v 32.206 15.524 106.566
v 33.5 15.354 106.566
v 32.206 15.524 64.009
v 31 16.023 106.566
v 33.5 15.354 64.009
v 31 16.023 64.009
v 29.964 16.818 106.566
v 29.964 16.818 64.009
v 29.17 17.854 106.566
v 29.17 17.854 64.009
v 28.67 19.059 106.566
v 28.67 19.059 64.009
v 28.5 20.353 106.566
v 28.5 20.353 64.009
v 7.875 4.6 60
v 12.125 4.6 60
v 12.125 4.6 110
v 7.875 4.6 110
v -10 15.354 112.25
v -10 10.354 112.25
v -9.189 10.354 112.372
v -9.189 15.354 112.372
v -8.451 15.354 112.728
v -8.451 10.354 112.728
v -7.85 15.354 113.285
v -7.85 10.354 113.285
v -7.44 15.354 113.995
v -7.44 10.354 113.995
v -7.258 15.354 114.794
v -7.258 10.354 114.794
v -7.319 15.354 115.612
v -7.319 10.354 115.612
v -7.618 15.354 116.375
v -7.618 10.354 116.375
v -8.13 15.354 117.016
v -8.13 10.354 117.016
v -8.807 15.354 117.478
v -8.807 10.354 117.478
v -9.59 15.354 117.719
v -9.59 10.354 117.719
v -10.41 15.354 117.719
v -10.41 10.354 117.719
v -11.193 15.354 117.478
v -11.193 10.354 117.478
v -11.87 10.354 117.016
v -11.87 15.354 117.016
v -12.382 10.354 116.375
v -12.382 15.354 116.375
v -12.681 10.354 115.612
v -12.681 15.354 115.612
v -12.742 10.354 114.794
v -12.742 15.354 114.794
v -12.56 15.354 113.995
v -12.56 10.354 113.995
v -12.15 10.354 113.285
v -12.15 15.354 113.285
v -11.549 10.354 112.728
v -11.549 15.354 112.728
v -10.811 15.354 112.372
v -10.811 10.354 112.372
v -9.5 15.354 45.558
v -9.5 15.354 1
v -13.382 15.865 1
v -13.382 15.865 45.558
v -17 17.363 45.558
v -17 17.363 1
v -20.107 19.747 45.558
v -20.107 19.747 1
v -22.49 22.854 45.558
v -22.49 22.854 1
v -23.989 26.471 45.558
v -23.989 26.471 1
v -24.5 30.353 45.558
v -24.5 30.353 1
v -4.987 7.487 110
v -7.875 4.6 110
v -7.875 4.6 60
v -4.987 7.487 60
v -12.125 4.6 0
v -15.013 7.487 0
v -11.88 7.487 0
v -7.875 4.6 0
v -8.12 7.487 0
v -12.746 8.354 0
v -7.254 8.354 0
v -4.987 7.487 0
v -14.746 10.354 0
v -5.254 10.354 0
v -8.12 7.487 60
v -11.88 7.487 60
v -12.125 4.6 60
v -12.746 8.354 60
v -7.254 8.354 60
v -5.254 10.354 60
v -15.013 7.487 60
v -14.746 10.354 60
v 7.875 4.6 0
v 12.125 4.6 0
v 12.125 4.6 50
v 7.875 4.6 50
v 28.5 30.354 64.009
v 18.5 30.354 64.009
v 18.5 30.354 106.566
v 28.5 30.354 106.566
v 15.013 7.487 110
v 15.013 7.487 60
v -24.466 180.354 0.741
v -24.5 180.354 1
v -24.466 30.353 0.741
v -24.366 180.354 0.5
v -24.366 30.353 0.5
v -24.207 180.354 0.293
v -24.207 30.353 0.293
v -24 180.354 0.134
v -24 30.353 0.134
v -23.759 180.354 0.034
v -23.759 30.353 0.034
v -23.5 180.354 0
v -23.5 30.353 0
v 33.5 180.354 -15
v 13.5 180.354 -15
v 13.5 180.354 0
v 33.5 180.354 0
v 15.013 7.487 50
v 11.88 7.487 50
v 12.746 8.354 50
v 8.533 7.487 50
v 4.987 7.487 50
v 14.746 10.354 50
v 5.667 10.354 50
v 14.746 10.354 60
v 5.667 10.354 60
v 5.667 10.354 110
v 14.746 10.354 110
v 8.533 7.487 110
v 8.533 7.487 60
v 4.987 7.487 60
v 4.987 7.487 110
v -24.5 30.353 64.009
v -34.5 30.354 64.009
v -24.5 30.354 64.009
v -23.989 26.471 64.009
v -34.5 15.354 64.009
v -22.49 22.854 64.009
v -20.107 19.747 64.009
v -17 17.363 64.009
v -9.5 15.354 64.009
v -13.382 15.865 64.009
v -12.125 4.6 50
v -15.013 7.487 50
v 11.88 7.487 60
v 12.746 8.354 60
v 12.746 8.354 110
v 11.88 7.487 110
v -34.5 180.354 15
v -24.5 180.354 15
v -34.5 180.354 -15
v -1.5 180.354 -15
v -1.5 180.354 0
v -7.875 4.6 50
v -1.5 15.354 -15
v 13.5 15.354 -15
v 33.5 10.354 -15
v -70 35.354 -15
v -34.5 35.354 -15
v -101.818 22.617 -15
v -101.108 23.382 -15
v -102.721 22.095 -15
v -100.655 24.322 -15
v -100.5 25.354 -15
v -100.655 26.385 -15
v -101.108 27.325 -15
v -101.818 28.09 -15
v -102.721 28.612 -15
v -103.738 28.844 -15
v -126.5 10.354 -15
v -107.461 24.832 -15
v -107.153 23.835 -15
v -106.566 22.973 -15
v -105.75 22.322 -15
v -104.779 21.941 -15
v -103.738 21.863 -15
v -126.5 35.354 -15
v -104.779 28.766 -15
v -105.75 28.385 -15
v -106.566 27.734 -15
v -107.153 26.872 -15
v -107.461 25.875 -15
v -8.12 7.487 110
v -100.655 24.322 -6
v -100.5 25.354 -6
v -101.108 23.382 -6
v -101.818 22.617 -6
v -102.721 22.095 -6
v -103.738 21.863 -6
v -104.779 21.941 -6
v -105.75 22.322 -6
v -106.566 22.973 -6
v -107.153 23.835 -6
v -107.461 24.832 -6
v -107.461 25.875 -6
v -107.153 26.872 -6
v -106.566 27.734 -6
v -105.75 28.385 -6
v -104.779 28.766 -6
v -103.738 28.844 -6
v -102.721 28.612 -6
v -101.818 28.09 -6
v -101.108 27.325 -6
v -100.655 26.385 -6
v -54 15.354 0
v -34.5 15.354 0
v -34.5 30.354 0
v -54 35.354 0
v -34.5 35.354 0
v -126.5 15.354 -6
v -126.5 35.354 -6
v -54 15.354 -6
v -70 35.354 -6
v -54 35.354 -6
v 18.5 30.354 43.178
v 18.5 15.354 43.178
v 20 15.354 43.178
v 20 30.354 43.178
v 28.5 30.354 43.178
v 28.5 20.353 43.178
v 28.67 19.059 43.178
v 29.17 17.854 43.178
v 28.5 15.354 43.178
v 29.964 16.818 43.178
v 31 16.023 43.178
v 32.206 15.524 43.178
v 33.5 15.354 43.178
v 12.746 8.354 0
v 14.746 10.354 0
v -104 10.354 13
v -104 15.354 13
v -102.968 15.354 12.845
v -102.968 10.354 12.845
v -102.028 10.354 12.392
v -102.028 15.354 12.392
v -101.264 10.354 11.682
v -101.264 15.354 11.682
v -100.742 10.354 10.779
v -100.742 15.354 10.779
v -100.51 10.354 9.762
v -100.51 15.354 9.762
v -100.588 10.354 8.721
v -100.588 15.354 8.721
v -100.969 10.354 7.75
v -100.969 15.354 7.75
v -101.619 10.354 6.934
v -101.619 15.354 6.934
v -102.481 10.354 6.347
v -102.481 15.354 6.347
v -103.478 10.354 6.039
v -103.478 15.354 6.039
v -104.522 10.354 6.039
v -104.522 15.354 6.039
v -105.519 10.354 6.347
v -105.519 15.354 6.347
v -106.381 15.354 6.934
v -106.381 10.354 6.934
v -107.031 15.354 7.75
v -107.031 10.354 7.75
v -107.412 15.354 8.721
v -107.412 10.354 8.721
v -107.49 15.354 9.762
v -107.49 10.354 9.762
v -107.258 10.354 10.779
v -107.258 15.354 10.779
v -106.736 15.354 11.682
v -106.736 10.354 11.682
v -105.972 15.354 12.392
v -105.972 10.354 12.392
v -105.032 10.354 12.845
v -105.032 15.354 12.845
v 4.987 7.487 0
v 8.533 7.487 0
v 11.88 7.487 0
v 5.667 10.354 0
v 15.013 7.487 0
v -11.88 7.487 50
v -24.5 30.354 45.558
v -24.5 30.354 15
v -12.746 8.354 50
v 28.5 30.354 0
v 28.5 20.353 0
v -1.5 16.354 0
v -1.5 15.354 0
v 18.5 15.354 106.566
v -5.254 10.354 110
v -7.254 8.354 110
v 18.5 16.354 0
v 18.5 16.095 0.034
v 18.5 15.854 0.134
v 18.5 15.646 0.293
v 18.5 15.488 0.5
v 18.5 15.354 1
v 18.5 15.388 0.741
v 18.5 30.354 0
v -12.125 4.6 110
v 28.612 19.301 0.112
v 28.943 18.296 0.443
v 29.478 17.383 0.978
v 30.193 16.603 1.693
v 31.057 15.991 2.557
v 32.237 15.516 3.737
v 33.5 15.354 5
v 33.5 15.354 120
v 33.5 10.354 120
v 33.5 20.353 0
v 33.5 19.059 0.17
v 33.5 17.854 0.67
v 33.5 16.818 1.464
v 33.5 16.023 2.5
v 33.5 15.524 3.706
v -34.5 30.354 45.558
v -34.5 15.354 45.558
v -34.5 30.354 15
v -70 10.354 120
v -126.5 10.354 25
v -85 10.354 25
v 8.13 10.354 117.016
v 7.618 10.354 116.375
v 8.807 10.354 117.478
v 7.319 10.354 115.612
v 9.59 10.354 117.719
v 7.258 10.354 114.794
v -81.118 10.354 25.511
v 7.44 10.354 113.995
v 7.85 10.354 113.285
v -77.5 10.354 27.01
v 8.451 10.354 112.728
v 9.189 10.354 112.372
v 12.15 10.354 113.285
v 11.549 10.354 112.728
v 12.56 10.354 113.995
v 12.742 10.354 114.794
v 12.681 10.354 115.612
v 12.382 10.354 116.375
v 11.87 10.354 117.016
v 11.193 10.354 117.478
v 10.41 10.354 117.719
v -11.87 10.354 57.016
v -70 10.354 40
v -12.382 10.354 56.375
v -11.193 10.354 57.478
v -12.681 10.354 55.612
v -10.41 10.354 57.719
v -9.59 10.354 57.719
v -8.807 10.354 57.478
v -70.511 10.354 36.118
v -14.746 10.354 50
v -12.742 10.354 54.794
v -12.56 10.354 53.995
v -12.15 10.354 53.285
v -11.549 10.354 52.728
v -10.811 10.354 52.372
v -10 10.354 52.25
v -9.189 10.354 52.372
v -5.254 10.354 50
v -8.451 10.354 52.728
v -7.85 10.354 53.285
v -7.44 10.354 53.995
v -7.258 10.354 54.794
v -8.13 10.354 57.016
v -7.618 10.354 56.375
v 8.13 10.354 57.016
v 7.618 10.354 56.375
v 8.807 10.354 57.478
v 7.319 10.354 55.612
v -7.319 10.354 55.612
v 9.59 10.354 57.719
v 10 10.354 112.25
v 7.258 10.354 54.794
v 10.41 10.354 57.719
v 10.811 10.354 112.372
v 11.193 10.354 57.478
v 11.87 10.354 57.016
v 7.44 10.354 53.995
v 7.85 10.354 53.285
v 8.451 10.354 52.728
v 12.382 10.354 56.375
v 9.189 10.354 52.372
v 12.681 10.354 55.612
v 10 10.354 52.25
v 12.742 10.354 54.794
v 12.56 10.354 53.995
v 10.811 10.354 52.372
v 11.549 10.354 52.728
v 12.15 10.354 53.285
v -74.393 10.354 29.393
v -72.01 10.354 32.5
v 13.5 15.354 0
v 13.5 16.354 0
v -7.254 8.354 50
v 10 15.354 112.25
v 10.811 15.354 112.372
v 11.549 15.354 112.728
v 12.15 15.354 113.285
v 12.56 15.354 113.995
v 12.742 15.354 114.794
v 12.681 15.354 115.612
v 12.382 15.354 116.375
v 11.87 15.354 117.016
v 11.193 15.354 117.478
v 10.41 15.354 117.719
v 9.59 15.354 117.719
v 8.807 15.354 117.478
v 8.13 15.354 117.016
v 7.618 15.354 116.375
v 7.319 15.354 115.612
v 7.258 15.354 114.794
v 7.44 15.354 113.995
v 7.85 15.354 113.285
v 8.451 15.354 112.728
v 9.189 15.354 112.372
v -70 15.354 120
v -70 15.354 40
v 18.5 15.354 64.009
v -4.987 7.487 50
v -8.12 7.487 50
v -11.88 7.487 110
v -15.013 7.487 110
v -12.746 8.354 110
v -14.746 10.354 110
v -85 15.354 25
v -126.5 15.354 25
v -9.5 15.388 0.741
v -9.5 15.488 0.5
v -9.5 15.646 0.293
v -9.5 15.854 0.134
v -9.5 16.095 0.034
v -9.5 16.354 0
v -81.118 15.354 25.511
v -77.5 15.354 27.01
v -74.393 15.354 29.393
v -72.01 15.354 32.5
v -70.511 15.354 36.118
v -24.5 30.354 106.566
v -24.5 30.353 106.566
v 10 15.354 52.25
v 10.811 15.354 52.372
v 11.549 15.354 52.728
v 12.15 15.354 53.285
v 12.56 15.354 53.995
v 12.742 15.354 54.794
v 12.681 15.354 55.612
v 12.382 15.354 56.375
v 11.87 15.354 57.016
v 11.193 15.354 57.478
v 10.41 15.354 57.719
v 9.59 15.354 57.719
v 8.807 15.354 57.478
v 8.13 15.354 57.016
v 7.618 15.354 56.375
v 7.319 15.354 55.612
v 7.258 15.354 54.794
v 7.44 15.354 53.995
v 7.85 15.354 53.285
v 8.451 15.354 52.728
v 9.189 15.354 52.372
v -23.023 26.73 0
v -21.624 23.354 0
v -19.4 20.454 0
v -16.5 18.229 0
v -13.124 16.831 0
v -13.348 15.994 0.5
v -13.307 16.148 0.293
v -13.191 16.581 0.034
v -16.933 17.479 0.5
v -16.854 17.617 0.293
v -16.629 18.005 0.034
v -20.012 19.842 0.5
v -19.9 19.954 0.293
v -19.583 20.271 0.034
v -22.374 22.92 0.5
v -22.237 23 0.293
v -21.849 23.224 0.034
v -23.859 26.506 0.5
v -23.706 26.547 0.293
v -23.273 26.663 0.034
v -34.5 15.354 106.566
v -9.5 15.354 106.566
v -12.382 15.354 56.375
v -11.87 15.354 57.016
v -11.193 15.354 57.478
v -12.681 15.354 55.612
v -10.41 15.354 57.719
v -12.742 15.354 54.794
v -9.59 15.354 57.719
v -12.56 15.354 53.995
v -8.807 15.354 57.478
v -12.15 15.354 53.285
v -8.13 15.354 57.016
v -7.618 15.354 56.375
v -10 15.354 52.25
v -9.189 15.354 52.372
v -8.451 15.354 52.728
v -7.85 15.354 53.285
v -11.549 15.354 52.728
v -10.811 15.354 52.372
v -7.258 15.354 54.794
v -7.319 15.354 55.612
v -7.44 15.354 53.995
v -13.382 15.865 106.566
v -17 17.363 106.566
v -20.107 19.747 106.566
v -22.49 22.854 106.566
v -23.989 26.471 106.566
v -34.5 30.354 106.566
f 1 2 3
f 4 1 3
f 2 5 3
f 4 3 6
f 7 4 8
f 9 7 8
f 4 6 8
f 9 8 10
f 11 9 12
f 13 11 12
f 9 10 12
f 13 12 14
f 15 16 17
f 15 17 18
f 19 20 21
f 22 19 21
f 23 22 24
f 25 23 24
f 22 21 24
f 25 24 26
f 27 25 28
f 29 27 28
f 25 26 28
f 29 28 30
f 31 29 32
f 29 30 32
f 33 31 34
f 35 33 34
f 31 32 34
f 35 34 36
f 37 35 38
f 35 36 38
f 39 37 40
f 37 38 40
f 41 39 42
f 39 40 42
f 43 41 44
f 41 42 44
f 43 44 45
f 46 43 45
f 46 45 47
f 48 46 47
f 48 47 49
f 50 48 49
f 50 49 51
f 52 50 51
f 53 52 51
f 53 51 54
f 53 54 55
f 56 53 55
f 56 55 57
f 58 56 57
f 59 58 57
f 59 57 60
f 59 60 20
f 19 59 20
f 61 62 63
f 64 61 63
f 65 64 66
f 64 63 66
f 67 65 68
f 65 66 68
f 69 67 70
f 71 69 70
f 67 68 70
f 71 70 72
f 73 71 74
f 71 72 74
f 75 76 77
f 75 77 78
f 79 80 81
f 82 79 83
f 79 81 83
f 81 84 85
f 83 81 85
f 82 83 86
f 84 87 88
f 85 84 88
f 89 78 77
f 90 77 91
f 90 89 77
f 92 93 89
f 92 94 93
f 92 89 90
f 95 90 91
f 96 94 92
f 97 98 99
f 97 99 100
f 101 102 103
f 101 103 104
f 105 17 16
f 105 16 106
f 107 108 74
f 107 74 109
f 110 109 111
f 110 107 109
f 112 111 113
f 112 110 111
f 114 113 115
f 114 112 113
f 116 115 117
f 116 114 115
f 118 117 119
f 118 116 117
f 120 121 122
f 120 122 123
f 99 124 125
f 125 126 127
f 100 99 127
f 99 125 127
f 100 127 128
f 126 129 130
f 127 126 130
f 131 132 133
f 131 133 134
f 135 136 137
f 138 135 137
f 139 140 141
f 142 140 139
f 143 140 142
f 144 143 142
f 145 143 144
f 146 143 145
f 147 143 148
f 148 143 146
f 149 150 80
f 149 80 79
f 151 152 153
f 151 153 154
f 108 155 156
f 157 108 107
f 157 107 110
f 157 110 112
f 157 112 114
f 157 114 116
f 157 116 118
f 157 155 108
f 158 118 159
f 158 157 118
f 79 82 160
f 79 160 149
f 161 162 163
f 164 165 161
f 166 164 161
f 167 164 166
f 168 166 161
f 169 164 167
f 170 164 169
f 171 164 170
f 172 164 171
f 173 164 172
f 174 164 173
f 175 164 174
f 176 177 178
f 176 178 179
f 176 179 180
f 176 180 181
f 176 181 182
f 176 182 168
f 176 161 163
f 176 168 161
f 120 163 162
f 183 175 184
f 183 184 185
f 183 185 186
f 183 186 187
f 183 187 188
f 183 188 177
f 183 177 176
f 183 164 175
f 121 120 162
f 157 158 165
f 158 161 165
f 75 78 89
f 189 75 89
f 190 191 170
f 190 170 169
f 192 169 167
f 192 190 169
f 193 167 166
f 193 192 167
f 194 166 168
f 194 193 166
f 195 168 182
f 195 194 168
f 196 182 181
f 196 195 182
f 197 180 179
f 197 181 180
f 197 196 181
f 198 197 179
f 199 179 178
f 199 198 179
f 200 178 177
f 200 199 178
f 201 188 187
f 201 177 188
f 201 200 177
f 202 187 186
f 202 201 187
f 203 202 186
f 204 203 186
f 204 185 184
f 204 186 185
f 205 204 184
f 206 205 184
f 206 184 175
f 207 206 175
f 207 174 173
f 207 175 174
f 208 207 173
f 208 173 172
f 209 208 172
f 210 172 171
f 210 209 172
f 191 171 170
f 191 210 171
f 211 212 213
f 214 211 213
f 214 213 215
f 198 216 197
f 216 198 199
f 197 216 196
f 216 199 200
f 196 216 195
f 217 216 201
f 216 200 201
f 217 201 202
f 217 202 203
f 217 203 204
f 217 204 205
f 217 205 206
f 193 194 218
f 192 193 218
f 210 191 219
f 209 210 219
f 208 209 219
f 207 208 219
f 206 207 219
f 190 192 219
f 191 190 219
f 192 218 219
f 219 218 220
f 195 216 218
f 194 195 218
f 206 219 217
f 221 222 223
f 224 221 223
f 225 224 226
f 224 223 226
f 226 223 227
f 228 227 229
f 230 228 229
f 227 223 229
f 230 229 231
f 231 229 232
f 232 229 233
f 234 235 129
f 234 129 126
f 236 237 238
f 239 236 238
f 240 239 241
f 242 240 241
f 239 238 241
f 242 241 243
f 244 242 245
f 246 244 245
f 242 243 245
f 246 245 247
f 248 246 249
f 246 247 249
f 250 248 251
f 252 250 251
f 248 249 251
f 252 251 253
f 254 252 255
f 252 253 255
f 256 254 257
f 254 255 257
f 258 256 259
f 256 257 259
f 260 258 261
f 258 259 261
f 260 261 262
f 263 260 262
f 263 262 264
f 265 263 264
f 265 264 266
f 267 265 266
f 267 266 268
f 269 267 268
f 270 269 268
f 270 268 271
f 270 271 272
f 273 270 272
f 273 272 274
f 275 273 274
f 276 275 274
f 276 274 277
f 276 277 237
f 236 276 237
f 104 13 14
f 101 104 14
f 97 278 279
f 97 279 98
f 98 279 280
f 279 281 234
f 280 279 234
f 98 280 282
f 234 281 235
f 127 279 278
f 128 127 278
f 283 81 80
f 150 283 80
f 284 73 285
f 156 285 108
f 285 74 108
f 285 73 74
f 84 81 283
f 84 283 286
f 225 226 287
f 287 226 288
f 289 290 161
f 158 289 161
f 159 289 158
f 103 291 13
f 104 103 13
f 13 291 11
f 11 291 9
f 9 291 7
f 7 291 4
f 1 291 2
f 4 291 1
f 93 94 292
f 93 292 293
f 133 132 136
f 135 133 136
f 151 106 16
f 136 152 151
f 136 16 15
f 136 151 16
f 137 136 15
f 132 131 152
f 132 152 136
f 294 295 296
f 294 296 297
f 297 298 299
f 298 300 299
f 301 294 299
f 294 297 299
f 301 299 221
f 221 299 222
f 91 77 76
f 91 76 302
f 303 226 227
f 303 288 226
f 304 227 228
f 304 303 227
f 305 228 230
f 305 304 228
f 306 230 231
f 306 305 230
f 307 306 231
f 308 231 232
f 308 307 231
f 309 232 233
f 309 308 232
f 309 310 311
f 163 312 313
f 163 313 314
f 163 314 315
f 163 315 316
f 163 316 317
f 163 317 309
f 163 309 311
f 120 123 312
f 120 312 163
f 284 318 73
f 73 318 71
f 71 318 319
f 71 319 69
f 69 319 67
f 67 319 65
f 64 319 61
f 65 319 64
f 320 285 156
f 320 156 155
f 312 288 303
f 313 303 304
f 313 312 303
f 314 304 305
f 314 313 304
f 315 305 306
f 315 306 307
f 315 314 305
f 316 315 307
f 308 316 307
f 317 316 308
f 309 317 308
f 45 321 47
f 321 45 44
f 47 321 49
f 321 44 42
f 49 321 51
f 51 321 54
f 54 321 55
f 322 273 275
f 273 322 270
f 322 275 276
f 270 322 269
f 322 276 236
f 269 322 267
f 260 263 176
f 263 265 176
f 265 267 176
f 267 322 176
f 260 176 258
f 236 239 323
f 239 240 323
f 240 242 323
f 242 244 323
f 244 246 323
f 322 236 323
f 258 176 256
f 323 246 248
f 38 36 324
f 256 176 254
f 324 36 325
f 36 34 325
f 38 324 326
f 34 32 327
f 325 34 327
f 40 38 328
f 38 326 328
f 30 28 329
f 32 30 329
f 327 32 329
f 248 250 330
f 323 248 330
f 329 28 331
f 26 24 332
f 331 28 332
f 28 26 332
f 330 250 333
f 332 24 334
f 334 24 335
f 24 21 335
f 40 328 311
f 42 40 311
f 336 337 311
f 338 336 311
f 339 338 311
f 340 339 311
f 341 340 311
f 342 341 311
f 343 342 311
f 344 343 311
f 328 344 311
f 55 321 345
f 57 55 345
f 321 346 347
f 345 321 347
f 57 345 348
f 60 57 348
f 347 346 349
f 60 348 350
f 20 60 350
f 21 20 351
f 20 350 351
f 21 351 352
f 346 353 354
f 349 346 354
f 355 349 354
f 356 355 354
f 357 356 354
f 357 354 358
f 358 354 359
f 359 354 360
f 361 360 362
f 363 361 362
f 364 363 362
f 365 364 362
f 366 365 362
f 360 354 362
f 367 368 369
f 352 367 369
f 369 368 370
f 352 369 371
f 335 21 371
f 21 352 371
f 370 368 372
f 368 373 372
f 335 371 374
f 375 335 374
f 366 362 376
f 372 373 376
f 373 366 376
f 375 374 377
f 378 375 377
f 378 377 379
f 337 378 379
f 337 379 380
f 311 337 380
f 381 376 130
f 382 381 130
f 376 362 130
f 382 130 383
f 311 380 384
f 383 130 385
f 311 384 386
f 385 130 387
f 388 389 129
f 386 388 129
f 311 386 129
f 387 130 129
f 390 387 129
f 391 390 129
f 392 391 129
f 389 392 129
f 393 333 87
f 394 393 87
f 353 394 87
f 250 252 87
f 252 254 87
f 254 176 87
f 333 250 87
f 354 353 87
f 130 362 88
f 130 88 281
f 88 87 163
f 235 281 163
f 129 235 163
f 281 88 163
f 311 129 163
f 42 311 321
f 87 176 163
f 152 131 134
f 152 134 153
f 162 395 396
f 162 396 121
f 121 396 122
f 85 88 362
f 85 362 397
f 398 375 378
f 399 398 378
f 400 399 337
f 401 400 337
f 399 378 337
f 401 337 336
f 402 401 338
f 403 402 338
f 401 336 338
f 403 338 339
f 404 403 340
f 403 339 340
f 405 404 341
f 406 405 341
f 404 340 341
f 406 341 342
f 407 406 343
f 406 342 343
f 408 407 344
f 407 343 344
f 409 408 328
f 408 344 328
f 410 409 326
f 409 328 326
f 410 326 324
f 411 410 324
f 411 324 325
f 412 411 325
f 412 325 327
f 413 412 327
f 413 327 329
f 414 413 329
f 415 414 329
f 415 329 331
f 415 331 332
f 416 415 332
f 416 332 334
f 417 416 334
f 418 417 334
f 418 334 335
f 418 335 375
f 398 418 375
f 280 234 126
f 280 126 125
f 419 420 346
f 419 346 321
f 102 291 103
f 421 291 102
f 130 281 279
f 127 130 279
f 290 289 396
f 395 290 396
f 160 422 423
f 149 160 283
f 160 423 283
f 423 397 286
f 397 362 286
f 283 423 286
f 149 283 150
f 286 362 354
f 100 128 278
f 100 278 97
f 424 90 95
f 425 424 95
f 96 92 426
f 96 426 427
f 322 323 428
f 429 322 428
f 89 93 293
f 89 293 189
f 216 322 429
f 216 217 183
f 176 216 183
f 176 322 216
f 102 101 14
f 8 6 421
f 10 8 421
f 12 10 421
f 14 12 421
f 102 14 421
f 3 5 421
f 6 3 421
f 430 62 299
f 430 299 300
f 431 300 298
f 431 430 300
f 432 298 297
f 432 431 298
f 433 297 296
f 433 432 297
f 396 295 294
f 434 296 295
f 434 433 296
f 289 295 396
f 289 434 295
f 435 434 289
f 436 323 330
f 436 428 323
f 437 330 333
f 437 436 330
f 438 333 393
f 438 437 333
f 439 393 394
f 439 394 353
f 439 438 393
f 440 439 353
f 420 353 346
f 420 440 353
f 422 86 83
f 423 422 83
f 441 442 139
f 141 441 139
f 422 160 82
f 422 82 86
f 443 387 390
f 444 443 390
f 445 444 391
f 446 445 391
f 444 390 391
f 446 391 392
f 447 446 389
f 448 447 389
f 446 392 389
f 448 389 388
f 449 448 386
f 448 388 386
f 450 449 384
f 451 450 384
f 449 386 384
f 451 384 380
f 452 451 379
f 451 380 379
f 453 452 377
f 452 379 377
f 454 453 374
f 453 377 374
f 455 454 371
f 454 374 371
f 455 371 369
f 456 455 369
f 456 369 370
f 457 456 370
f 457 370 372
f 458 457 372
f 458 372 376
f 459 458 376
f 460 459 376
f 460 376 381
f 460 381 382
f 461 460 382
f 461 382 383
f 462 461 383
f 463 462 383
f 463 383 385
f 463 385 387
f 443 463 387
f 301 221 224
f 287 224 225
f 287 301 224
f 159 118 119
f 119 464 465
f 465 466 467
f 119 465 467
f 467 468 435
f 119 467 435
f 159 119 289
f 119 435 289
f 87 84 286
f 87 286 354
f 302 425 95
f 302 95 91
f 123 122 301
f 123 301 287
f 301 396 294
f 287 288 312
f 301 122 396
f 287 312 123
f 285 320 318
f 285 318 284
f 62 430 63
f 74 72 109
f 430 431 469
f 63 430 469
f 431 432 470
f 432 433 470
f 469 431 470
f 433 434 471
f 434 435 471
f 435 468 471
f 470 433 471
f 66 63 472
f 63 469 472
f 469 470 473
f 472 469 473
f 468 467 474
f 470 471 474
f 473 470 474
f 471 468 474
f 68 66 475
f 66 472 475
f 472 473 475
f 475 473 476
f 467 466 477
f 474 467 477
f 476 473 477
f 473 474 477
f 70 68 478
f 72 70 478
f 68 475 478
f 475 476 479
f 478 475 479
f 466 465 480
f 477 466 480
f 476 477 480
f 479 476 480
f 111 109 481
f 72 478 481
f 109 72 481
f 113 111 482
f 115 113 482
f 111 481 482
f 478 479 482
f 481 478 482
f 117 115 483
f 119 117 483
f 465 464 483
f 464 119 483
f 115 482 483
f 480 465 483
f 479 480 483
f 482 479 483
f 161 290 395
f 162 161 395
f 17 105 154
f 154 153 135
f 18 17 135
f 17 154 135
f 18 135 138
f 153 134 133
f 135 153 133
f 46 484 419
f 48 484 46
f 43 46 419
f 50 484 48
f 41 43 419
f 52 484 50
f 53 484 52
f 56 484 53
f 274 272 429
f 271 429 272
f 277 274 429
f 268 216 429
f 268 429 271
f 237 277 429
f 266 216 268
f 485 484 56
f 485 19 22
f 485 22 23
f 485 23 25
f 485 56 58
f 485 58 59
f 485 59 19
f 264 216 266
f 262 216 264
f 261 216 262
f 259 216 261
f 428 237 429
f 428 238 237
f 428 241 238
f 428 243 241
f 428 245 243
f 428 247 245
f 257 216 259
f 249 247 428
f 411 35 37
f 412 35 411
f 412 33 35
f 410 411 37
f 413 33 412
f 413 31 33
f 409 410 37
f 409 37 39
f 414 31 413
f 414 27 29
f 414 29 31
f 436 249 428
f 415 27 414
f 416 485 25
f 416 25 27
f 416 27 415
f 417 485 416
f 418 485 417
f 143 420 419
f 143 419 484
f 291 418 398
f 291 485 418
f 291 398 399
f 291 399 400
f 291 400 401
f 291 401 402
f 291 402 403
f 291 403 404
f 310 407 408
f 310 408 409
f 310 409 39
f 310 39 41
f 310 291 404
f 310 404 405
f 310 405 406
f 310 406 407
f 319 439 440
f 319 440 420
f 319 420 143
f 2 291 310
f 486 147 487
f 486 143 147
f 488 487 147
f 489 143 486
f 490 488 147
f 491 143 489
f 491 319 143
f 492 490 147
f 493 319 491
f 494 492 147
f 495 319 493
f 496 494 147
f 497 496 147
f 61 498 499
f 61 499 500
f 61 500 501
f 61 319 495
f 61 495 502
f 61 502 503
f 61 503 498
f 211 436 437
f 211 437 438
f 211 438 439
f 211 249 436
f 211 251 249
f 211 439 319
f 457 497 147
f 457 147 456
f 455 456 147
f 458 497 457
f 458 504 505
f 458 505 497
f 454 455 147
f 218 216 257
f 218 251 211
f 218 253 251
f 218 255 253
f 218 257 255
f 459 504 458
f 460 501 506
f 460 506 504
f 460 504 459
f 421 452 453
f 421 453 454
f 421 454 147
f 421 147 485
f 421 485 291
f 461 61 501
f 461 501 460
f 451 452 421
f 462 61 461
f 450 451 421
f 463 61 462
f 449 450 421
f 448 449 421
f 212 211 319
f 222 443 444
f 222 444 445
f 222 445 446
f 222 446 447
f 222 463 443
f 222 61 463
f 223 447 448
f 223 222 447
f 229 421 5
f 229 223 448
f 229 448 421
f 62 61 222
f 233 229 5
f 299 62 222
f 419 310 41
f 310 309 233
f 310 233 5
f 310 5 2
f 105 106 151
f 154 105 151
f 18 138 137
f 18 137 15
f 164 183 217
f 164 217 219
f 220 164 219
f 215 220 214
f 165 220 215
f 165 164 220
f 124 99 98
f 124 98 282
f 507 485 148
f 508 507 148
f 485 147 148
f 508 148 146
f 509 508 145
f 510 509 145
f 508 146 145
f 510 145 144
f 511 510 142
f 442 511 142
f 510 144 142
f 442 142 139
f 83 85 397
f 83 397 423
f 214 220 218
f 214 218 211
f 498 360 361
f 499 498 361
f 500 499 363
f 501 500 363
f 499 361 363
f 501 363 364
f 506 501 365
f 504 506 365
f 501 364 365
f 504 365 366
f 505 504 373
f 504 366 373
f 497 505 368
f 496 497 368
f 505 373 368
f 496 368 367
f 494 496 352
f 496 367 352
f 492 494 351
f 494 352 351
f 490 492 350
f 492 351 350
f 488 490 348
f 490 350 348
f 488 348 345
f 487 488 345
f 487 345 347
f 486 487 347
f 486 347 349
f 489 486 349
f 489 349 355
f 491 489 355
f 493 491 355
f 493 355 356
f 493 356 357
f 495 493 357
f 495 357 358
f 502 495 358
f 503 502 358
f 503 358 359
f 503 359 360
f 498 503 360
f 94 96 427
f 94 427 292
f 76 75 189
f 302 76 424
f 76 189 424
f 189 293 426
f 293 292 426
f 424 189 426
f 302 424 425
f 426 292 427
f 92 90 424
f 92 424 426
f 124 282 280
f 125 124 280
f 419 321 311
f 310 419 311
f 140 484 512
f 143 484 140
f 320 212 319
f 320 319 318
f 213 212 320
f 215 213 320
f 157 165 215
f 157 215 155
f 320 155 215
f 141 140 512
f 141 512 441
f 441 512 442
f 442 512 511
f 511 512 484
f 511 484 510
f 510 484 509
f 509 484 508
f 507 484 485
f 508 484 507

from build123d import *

# Parameters (mm, degrees)
BOSS_EXTRUDE1_DEPTH      = 250
BOSS_EXTRUDE2_DEPTH      = 50
BOSS_EXTRUDE2_2_DEPTH    = 50
LPATTERN1_COUNT          = 4
LPATTERN1_PITCH          = 60
SKETCH2_R                = 2.75
CUT_EXTRUDE1_DEPTH       = 251.864711302
UPPER_ACRYLIC_SUPP_W     = 20
UPPER_ACRYLIC_SUPP_H     = 250
BOSS_EXTRUDE3_DEPTH      = 5
UPPER_ACRYLIC_SUPP_3_W   = 10
UPPER_ACRYLIC_SUPP_3_H   = 66.073604859
UPPER_ACRYLIC_SUPP_3_H_2 = 41.475217291
UPPER_ACRYLIC_SUPP_3_H_3 = 42.557179481
UPPER_ACRYLIC_SUPP_3_H_4 = 45.558340935
BOSS_EXTRUDE4_DEPTH      = 15
FILLET1_R                = 15
SKETCH4_W                = 60
SKETCH4_H                = 15
BOSS_EXTRUDE5_DEPTH      = 5
SKETCH4_3_W              = 60
SKETCH4_3_H              = 15
BOSS_EXTRUDE6_DEPTH      = 60
SKETCH5_W                = 10
SKETCH5_H                = 45
BOSS_EXTRUDE7_DEPTH      = 15
BOSS_EXTRUDE8_START      = 250
SKETCH5_3_W              = 10
SKETCH5_3_H              = 45
BOSS_EXTRUDE8_DEPTH      = 15
FILLET2_R                = 1
SKETCH6_W                = 6
SKETCH6_H                = 60
CUT_EXTRUDE2_DEPTH       = 6
BOSS_EXTRUDE9_DEPTH      = 30
SKETCH8_W                = 333.602701612
SKETCH8_H                = 59.031331047
CUT_EXTRUDE3_DEPTH       = 150
SKETCH9_W                = 6
SKETCH9_H                = 20
CLOTH_ESCAPE_GAP_DEPTH   = 20
SKETCH11_W               = 9
SKETCH11_H               = 20
BOSS_EXTRUDE11_DEPTH     = 100
CUT_EXTRUDE4_DEPTH       = 68
SKETCH13_W               = 40
SKETCH13_H               = 5
BOSS_EXTRUDE13_DEPTH     = 100
CUT_EXTRUDE5_DEPTH       = 100
FILLET3_R                = 15
BOSS_EXTRUDE14_START     = -5
BOSS_EXTRUDE14_DEPTH     = 25
CUT_EXTRUDE6_DEPTH       = 30
CUT_EXTRUDE6_DEPTH_BACK  = 10
SKETCH16_5_W             = 8.5
SKETCH16_5_H             = 41.475217291
SKETCH16_5_H_2           = 42.557179481
SKETCH16_5_W_2           = 1.5
SKETCH16_5_H_3           = 42.177819043
SKETCH16_5_H_4           = 20.831100018
SKETCH16_5_H_5           = 17.311395043
SKETCH16_5_H_6           = 18.573684265
SKETCH16_5_H_7           = 65.073604859
SKETCH16_6_W             = 8.5
SKETCH16_6_H             = 41.475217291
SKETCH16_6_H_2           = 42.557179481
SKETCH16_6_W_2           = 1.5
SKETCH16_6_H_3           = 42.177819043
SKETCH16_6_H_4           = 20.831100018
SKETCH16_6_H_5           = 17.311395043
SKETCH16_6_H_6           = 18.573684265
SKETCH16_6_H_7           = 65.073604859
BOSS_EXTRUDE15_DEPTH     = 5
BOSS_EXTRUDE16_DEPTH     = 20
SKETCH16_8_W             = 8.5
SKETCH16_8_H             = 41.475217291
SKETCH16_8_H_2           = 42.557179481
SKETCH16_8_W_2           = 1.5
SKETCH16_8_H_3           = 42.177819043
SKETCH16_8_H_4           = 65.073604859
BOSS_EXTRUDE17_DEPTH     = 15
BOSS_EXTRUDE18_START     = -5
BOSS_EXTRUDE18_DEPTH     = 25
FILLET4_R                = 5
BOSS_EXTRUDE21_START     = 145
BOSS_EXTRUDE21_DEPTH     = 170
SKETCH19_R               = 3.5
CUT_EXTRUDE7_DEPTH       = 10
CUT_EXTRUDE8_DEPTH       = 355
CUT_EXTRUDE8_DEPTH_BACK  = 10
SKETCH20_R               = 3.5
SKETCH21_W               = 15
SKETCH21_H               = 197.501027769
CUT_EXTRUDE9_DEPTH       = 130
SKETCH22_W               = 160
SKETCH22_H               = 135
SKETCH22_H_2             = 10
CUT_EXTRUDE10_DEPTH      = 270


with BuildPart() as part:
    # profile → Boss-Extrude1 (new body)
    with BuildSketch(Plane.XY):
        Polygon((-14.746446609, 10.353553391), (-5.253553391, 10.353553391), (5.667330529, 10.353553391), (14.746446609, 10.353553391), (20, 10.353553391), (20, 15.353553391), (-20, 15.353553391), (-20, 10.353553391), align=None)
    extrude(amount=BOSS_EXTRUDE1_DEPTH)

    # Sketch2 → Cut-Extrude1 (cut, through all)
    with BuildSketch(Plane.XZ.offset(-10.353553391)):
        with Locations(Location((-10, 175, 0), (0, 0, 270))):
            Circle(SKETCH2_R)
        with Locations(Location((10, 175, 0), (0, 0, 270))):
            Circle(SKETCH2_R)
        with Locations(Location((-10, 115, 0), (0, 0, 270))):
            Circle(SKETCH2_R)
        with Locations(Location((10, 115, 0), (0, 0, 270))):
            Circle(SKETCH2_R)
        with Locations(Location((-10, 55, 0), (0, 0, 270))):
            Circle(SKETCH2_R)
        with Locations(Location((10, 55, 0), (0, 0, 270))):
            Circle(SKETCH2_R)
    extrude(amount=-CUT_EXTRUDE1_DEPTH, mode=Mode.SUBTRACT)

    # upper_acrylic_supp → Boss-Extrude3 (add)
    with BuildSketch(Plane(origin=(0, 15.353553391, 0), x_dir=(1, 0, 0), z_dir=(0, 1, 0))):
        with Locations((-30, -125)):
            Rectangle(UPPER_ACRYLIC_SUPP_W, UPPER_ACRYLIC_SUPP_H)
    extrude(amount=-BOSS_EXTRUDE3_DEPTH)

    # upper_acrylic_supp<3> → Boss-Extrude4 (add)
    with BuildSketch(Plane(origin=(0, 15.353553391, 0), x_dir=(1, 0, 0), z_dir=(0, 1, 0))):
        with Locations((-29.5, -216.963197571)):
            Rectangle(UPPER_ACRYLIC_SUPP_3_W, UPPER_ACRYLIC_SUPP_3_H)
        with Locations((-29.5, -144.615102231)):
            Rectangle(UPPER_ACRYLIC_SUPP_3_W, UPPER_ACRYLIC_SUPP_3_H_2)
        with Locations((-29.5, -85.287508801)):
            Rectangle(UPPER_ACRYLIC_SUPP_3_W, UPPER_ACRYLIC_SUPP_3_H_3)
        with Locations((-29.5, -22.779170468)):
            Rectangle(UPPER_ACRYLIC_SUPP_3_W, UPPER_ACRYLIC_SUPP_3_H_4)
    extrude(amount=BOSS_EXTRUDE4_DEPTH)

    # Fillet1
    fillet1_edges = [part.edges().sort_by_distance(p)[0] for p in [
        (-24.5, 15.353553391, 22.779170467),
        (-24.5, 15.353553391, 85.287508801),
        (-24.5, 15.353553391, 144.615102231),
        (-24.5, 15.353553391, 216.963197571),
    ]]
    fillet(fillet1_edges, radius=FILLET1_R - 0.0001)  # a hair under: the kernel refuses the full size



with BuildPart() as body_2:
    # Sketch1<3> → Boss-Extrude2 (new body)
    with BuildSketch(Plane.XY):
        Polygon((-7.253553391, 8.353553391), (-8.119669914, 7.487436867), (-5.5, 7.487436867), (-4.987436867, 7.487436867), (-5.5, 6.974873734), (-7.874873734, 4.6), (-12.125126266, 4.6), (-14.5, 6.974873734), (-15.012563133, 7.487436867), (-14.5, 7.487436867), (-11.880330086, 7.487436867), (-12.746446609, 8.353553391), (-14.746446609, 10.353553391), (-5.253553391, 10.353553391), align=None)
    boss_extrude2 = extrude(amount=BOSS_EXTRUDE2_DEPTH)


with BuildPart() as body_3:
    # Sketch1<3> → Boss-Extrude2 2 (new body)
    with BuildSketch(Plane.XY):
        Polygon((12.746446609, 8.353553391), (11.880330086, 7.487436867), (14.5, 7.487436867), (15.012563133, 7.487436867), (14.5, 6.974873734), (12.125126266, 4.6), (7.874873734, 4.6), (5.5, 6.974873734), (4.987436867, 7.487436867), (5.5, 7.487436867), (8.533447053, 7.487436867), (7.667330529, 8.353553391), (5.667330529, 10.353553391), (14.746446609, 10.353553391), align=None)
    boss_extrude2_2 = extrude(amount=BOSS_EXTRUDE2_2_DEPTH)


with BuildPart() as lpattern1_1:
    # LPattern1: pattern copy
    add(boss_extrude2.moved(Location(Vector(0, 0, 1) * (1 * LPATTERN1_PITCH))))


with BuildPart() as lpattern1_2:
    # LPattern1: pattern copy
    add(boss_extrude2.moved(Location(Vector(0, 0, 1) * (2 * LPATTERN1_PITCH))))


with BuildPart() as lpattern1_3:
    # LPattern1: pattern copy
    add(boss_extrude2.moved(Location(Vector(0, 0, 1) * (3 * LPATTERN1_PITCH))))


with BuildPart() as lpattern1_4:
    # LPattern1: pattern copy
    add(boss_extrude2_2.moved(Location(Vector(0, 0, 1) * (1 * LPATTERN1_PITCH))))


with BuildPart() as lpattern1_5:
    # LPattern1: pattern copy
    add(boss_extrude2_2.moved(Location(Vector(0, 0, 1) * (2 * LPATTERN1_PITCH))))


with BuildPart() as lpattern1_6:
    # LPattern1: pattern copy
    add(boss_extrude2_2.moved(Location(Vector(0, 0, 1) * (3 * LPATTERN1_PITCH))))


with BuildPart() as part_1:
    add(part.part)

    add(body_2.part)  # Boss-Extrude5 merges body 2

    add(body_3.part)  # Boss-Extrude5 merges body 3
    # Sketch4 → Boss-Extrude5 (add, symmetric)
    with BuildSketch(Plane(origin=(0, 15.353553391, 0), x_dir=(1, 0, 0), z_dir=(0, 1, 0))):
        with Locations((-10, -257.5)):
            Rectangle(SKETCH4_W, SKETCH4_H)
        with Locations((-10, 7.5)):
            Rectangle(SKETCH4_W, SKETCH4_H)
    extrude(amount=BOSS_EXTRUDE5_DEPTH, both=True)

    # Sketch4<3> → Boss-Extrude6 (add)
    with BuildSketch(Plane(origin=(0, 15.353553391, 0), x_dir=(1, 0, 0), z_dir=(0, 1, 0))):
        with Locations((-10, -257.5)):
            Rectangle(SKETCH4_3_W, SKETCH4_3_H)
        with Locations((-10, 7.5)):
            Rectangle(SKETCH4_3_W, SKETCH4_3_H)
    extrude(amount=BOSS_EXTRUDE6_DEPTH)

    # Sketch5 → Boss-Extrude7 (add)
    with BuildSketch(Plane(origin=(0, 0, 250), x_dir=(-1, 0, 0), z_dir=(0, 0, -1))):
        with Locations((29.5, 52.853553391)):
            Rectangle(SKETCH5_W, SKETCH5_H)
    extrude(amount=BOSS_EXTRUDE7_DEPTH)

    # Sketch5<3> → Boss-Extrude8 (add)
    with BuildSketch(Plane(origin=(0, 0, 250), x_dir=(-1, 0, 0), z_dir=(0, 0, -1)).offset(BOSS_EXTRUDE8_START)):
        with Locations((29.5, 52.853553391)):
            Rectangle(SKETCH5_3_W, SKETCH5_3_H)
    extrude(amount=-BOSS_EXTRUDE8_DEPTH)

    # Fillet2
    fillet2_edges = [part_1.edges().sort_by_distance(p)[0] for p in [
        (-24.5, 52.853503391, 250),
        (-24.5, 52.853503391, 0),
        (5.24995, 15.353553391, 250),
        (-20.106631007, 19.746922384, 250),
        (-20.106631007, 19.746922384, 0),
        (5.24995, 15.353553391, 0),
    ]]
    fillet(fillet2_edges, radius=FILLET2_R)

    # Sketch6 → Cut-Extrude2 (cut)
    with BuildSketch(Plane.ZY.offset(40)):
        with Locations((253, 45.353553391)):
            Rectangle(SKETCH6_W, SKETCH6_H)
        with Locations((-3, 45.353553391)):
            Rectangle(SKETCH6_W, SKETCH6_H)
    extrude(amount=-CUT_EXTRUDE2_DEPTH, mode=Mode.SUBTRACT)

    # Sketch7 → Boss-Extrude9 (add)
    with BuildSketch(Plane.ZY.offset(40)):
        Polygon((265, 75.353553391), (256, 75.353553391), (256, 15.353553391), (-6, 15.353553391), (-6, 75.353553391), (-15, 75.353553391), (-15, 10.353553391), (265, 10.353553391), align=None)
    extrude(amount=BOSS_EXTRUDE9_DEPTH)

    # Sketch8 → Cut-Extrude3 (cut)
    with BuildSketch(Plane.ZY.offset(70)):
        with Locations((122.426839416, 64.869218915)):
            Rectangle(SKETCH8_W, SKETCH8_H)
    extrude(amount=-CUT_EXTRUDE3_DEPTH, mode=Mode.SUBTRACT)

    # Sketch9 → cloth_escape_gap (add)
    with BuildSketch(Plane.ZY.offset(34)):
        with Locations((253, 25.353553391)):
            Rectangle(SKETCH9_W, SKETCH9_H)
        with Locations((-3, 25.353553391)):
            Rectangle(SKETCH9_W, SKETCH9_H)
    extrude(amount=CLOTH_ESCAPE_GAP_DEPTH)

    # Sketch11 → Boss-Extrude11 (add)
    with BuildSketch(Plane.ZY.offset(70)):
        with Locations((-10.5, 25.353553391)):
            Rectangle(SKETCH11_W, SKETCH11_H)
        with Locations((260.5, 25.353553391)):
            Rectangle(SKETCH11_W, SKETCH11_H)
    extrude(amount=BOSS_EXTRUDE11_DEPTH)

    # Sketch12 → Cut-Extrude4 (cut)
    with BuildSketch(Plane.XZ.offset(-10.353553391)):
        Polygon((-170, 265), (-70, 265), (-170, 260.5), align=None)
        Polygon((-70, -15), (-170, -10.5), (-170, -15), align=None)
    extrude(amount=-CUT_EXTRUDE4_DEPTH, mode=Mode.SUBTRACT)

    # Sketch13 → Boss-Extrude13 (add)
    with BuildSketch(Plane.ZY.offset(70)):
        with Locations((5, 12.853553391)):
            Rectangle(SKETCH13_W, SKETCH13_H)
        with Locations((245, 12.853553391)):
            Rectangle(SKETCH13_W, SKETCH13_H)
    extrude(amount=BOSS_EXTRUDE13_DEPTH)

    # Sketch14 → Cut-Extrude5 (cut)
    with BuildSketch(Plane(origin=(0, 15.353553391, 0), x_dir=(1, 0, 0), z_dir=(0, 1, 0))):
        Polygon((-70, -265), (-170, -260.5), (-170, -265), align=None)
        Polygon((-170, 15), (-170, 10.5), (-70, 15), align=None)
    extrude(amount=-CUT_EXTRUDE5_DEPTH, mode=Mode.SUBTRACT)

    # Fillet3
    fillet3_edges = [part_1.edges().sort_by_distance(p)[0] for p in [
        (-70, 12.853553391, 25),
        (-70, 12.853553391, 225),
    ]]
    fillet(fillet3_edges, radius=FILLET3_R)

    # Sketch16 → Boss-Extrude14 (add)
    with BuildSketch(Plane(origin=(0, 15.353553391, 0), x_dir=(1, 0, 0), z_dir=(0, 1, 0)).offset(BOSS_EXTRUDE14_START)):
        Polygon((28.5, 0), (33.5, 0), (33.5, 15), (18.5, 15), (18.5, 0), align=None)
        Polygon((18.5, -250), (18.5, -265), (33.5, -265), (33.5, -250), (28.5, -250), align=None)
    extrude(amount=BOSS_EXTRUDE14_DEPTH)

    # Sketch16<5> → Cut-Extrude6 (cut, two sides: drawn at the far end of the back side and taken through both)
    with BuildSketch(Plane(origin=(0, 15.353553391, 0), x_dir=(1, 0, 0), z_dir=(0, 1, 0)).offset(-CUT_EXTRUDE6_DEPTH_BACK)):
        Polygon((18.5, -250), (18.5, -265), (33.5, -265), (33.5, -250), (28.5, -250), align=None)
        Polygon((28.5, -250), (33.5, -250), (33.5, 0), (28.5, 0), (28.5, -43.177819043), (20, -43.177819043), (20, -64.008919061), (28.5, -64.008919061), (28.5, -106.566098542), (20, -106.566098542), (20, -123.877493585), (28.5, -123.877493585), (28.5, -165.352710876), (20, -165.352710876), (20, -183.926395141), (28.5, -183.926395141), align=None)
        with Locations((24.25, -144.615102231)):
            Rectangle(SKETCH16_5_W, SKETCH16_5_H)
        with Locations((24.25, -85.287508801)):
            Rectangle(SKETCH16_5_W, SKETCH16_5_H_2)
        Polygon((28.5, -43.177819043), (28.5, 0), (18.5, 0), (18.5, -1), (20, -1), (20, -43.177819043), align=None)
        Polygon((28.5, 0), (33.5, 0), (33.5, 15), (18.5, 15), (18.5, 0), align=None)
        with Locations((19.25, -22.088909521)):
            Rectangle(SKETCH16_5_W_2, SKETCH16_5_H_3)
        with Locations((19.25, -53.593369052)):
            Rectangle(SKETCH16_5_W_2, SKETCH16_5_H_4)
        with Locations((19.25, -85.287508801)):
            Rectangle(SKETCH16_5_W_2, SKETCH16_5_H_2)
        with Locations((19.25, -115.221796064)):
            Rectangle(SKETCH16_5_W_2, SKETCH16_5_H_5)
        with Locations((19.25, -144.615102231)):
            Rectangle(SKETCH16_5_W_2, SKETCH16_5_H)
        with Locations((19.25, -174.639553009)):
            Rectangle(SKETCH16_5_W_2, SKETCH16_5_H_6)
        with Locations((19.25, -216.463197571)):
            Rectangle(SKETCH16_5_W_2, SKETCH16_5_H_7)
        Polygon((18.5, -249), (18.5, -250), (28.5, -250), (28.5, -183.926395141), (20, -183.926395141), (20, -249), align=None)
    extrude(amount=CUT_EXTRUDE6_DEPTH + CUT_EXTRUDE6_DEPTH_BACK, mode=Mode.SUBTRACT)

    # Sketch16<6> → Boss-Extrude15 (add)
    with BuildSketch(Plane(origin=(0, 15.353553391, 0), x_dir=(1, 0, 0), z_dir=(0, 1, 0))):
        Polygon((28.5, -250), (33.5, -250), (33.5, 0), (28.5, 0), (28.5, -43.177819043), (20, -43.177819043), (20, -64.008919061), (28.5, -64.008919061), (28.5, -106.566098542), (20, -106.566098542), (20, -123.877493585), (28.5, -123.877493585), (28.5, -165.352710876), (20, -165.352710876), (20, -183.926395141), (28.5, -183.926395141), align=None)
        Polygon((18.5, -249), (18.5, -250), (28.5, -250), (28.5, -183.926395141), (20, -183.926395141), (20, -249), align=None)
        Polygon((18.5, -250), (18.5, -265), (33.5, -265), (33.5, -250), (28.5, -250), align=None)
        with Locations((24.25, -144.615102231)):
            Rectangle(SKETCH16_6_W, SKETCH16_6_H)
        with Locations((24.25, -85.287508801)):
            Rectangle(SKETCH16_6_W, SKETCH16_6_H_2)
        Polygon((28.5, -43.177819043), (28.5, 0), (18.5, 0), (18.5, -1), (20, -1), (20, -43.177819043), align=None)
        Polygon((28.5, 0), (33.5, 0), (33.5, 15), (18.5, 15), (18.5, 0), align=None)
        with Locations((19.25, -22.088909521)):
            Rectangle(SKETCH16_6_W_2, SKETCH16_6_H_3)
        with Locations((19.25, -53.593369052)):
            Rectangle(SKETCH16_6_W_2, SKETCH16_6_H_4)
        with Locations((19.25, -85.287508801)):
            Rectangle(SKETCH16_6_W_2, SKETCH16_6_H_2)
        with Locations((19.25, -115.221796064)):
            Rectangle(SKETCH16_6_W_2, SKETCH16_6_H_5)
        with Locations((19.25, -144.615102231)):
            Rectangle(SKETCH16_6_W_2, SKETCH16_6_H)
        with Locations((19.25, -174.639553009)):
            Rectangle(SKETCH16_6_W_2, SKETCH16_6_H_6)
        with Locations((19.25, -216.463197571)):
            Rectangle(SKETCH16_6_W_2, SKETCH16_6_H_7)
    extrude(amount=-BOSS_EXTRUDE15_DEPTH)

    # Sketch16<7> → Boss-Extrude16 (add)
    with BuildSketch(Plane(origin=(0, 15.353553391, 0), x_dir=(1, 0, 0), z_dir=(0, 1, 0))):
        Polygon((18.5, -250), (18.5, -265), (33.5, -265), (33.5, -250), (28.5, -250), align=None)
        Polygon((28.5, 0), (33.5, 0), (33.5, 15), (18.5, 15), (18.5, 0), align=None)
    extrude(amount=BOSS_EXTRUDE16_DEPTH)

    # Sketch16<8> → Boss-Extrude17 (add)
    with BuildSketch(Plane(origin=(0, 15.353553391, 0), x_dir=(1, 0, 0), z_dir=(0, 1, 0))):
        Polygon((18.5, -249), (18.5, -250), (28.5, -250), (28.5, -183.926395141), (20, -183.926395141), (20, -249), align=None)
        with Locations((24.25, -144.615102231)):
            Rectangle(SKETCH16_8_W, SKETCH16_8_H)
        with Locations((24.25, -85.287508801)):
            Rectangle(SKETCH16_8_W, SKETCH16_8_H_2)
        Polygon((28.5, -43.177819043), (28.5, 0), (18.5, 0), (18.5, -1), (20, -1), (20, -43.177819043), align=None)
        with Locations((19.25, -22.088909521)):
            Rectangle(SKETCH16_8_W_2, SKETCH16_8_H_3)
        with Locations((19.25, -85.287508801)):
            Rectangle(SKETCH16_8_W_2, SKETCH16_8_H_2)
        with Locations((19.25, -144.615102231)):
            Rectangle(SKETCH16_8_W_2, SKETCH16_8_H)
        with Locations((19.25, -216.463197571)):
            Rectangle(SKETCH16_8_W_2, SKETCH16_8_H_4)
    extrude(amount=BOSS_EXTRUDE17_DEPTH)

    # Sketch14<2> → Boss-Extrude18 (add)
    with BuildSketch(Plane(origin=(0, 15.353553391, 0), x_dir=(1, 0, 0), z_dir=(0, 1, 0)).offset(BOSS_EXTRUDE18_START)):
        Polygon((-70, -265), (-170, -260.5), (-170, -265), align=None)
        Polygon((-170, 15), (-170, 10.5), (-70, 15), align=None)
    extrude(amount=BOSS_EXTRUDE18_DEPTH)

    # Fillet4
    fillet4_edges = [part_1.edges().sort_by_distance(p)[0] for p in [
        (31, 15.353553391, 0),
        (28.5, 15.353553391, 21.588909521),
        (28.5, 15.353553391, 85.287508801),
        (28.5, 15.353553391, 144.615102231),
        (31, 15.353553391, 250),
        (28.5, 15.353553391, 216.963197571),
    ]]
    fillet(fillet4_edges, radius=FILLET4_R - 0.0001)  # a hair under: the kernel refuses the full size

    # Sketch18 → Boss-Extrude21 (add)
    with BuildSketch(Plane(origin=(0, 35.353553391, 0), x_dir=(1, 0, 0), z_dir=(0, 1, 0)).offset(BOSS_EXTRUDE21_START)):
        with BuildLine():
            Line((-34.5, -250), (-34.5, -265))
            Line((-34.5, -265), (33.5, -265))
            Line((33.5, -265), (33.5, -250))
            Line((33.5, -250), (-23.5, -250))
            ThreePointArc((-23.5, -250), (-24.207106781, -249.707106781), (-24.5, -249))
            Line((-24.5, -249), (-24.5, -235))
            Line((-24.5, -235), (-34.5, -235))
            Line((-34.5, -235), (-34.5, -250))
        make_face()
        with BuildLine():
            Line((-34.5, 15), (-34.5, 0))
            Line((-34.5, 0), (-34.5, -15))
            Line((-34.5, -15), (-24.5, -15))
            Line((-24.5, -15), (-24.5, -1))
            ThreePointArc((-24.5, -1), (-24.207106781, -0.292893219), (-23.5, 0))
            Line((-23.5, 0), (33.5, 0))
            Line((33.5, 0), (33.5, 15))
            Line((33.5, 15), (-34.5, 15))
        make_face()
    extrude(amount=-BOSS_EXTRUDE21_DEPTH)

    # Sketch19 → Cut-Extrude7 (cut)
    with BuildSketch(Plane(origin=(0, 15.353553391, 0), x_dir=(1, 0, 0), z_dir=(0, 1, 0))):
        with Locations(Location((-154, -9.5, 0), (0, 0, 270))):
            Circle(SKETCH19_R)
        with Locations(Location((-104, -9.5, 0), (0, 0, 270))):
            Circle(SKETCH19_R)
        with Locations(Location((-104, -240.5, 0), (0, 0, 270))):
            Circle(SKETCH19_R)
        with Locations(Location((-154, -240.5, 0), (0, 0, 270))):
            Circle(SKETCH19_R)
    extrude(amount=-CUT_EXTRUDE7_DEPTH, mode=Mode.SUBTRACT)

    # Sketch20 → Cut-Extrude8 (cut, two sides: drawn at the far end of the back side and taken through both)
    with BuildSketch(Plane(origin=(0, 0, 256), x_dir=(-1, 0, 0), z_dir=(0, 0, -1)).offset(-CUT_EXTRUDE8_DEPTH_BACK)):
        with Locations(Location((104, 25.353553391, 0), (0, 0, 180))):
            Circle(SKETCH20_R)
        with Locations(Location((154, 25.353553391, 0), (0, 0, 180))):
            Circle(SKETCH20_R)
    extrude(amount=CUT_EXTRUDE8_DEPTH + CUT_EXTRUDE8_DEPTH_BACK, mode=Mode.SUBTRACT)

    # Sketch21 → Cut-Extrude9 (cut)
    with BuildSketch(Plane.XY):
        with Locations((6, 114.104067276)):
            Rectangle(SKETCH21_W, SKETCH21_H)
    extrude(amount=-CUT_EXTRUDE9_DEPTH, mode=Mode.SUBTRACT)


with BuildPart() as cut_extrude10_tool:
    # Sketch22 → Cut-Extrude10 (new body)
    with BuildSketch(Plane(origin=(0, 0, 0), x_dir=(1, 0, 0), z_dir=(0, 1, 0))):
        with Locations((-46.5, -197.5)):
            Rectangle(SKETCH22_W, SKETCH22_H)
        Polygon((-126.5, 15), (-186.5, 15), (-186.5, -265), (-126.5, -265), (-126.5, -130), (-126.5, -120), align=None)
        with Locations((-46.5, -125)):
            Rectangle(SKETCH22_W, SKETCH22_H_2)
    extrude(amount=CUT_EXTRUDE10_DEPTH)


with BuildPart() as part_2:
    add(part_1.part)

    # Cut-Extrude10: cut by cut_extrude10_tool
    add(cut_extrude10_tool.part, mode=Mode.SUBTRACT)


with BuildPart() as lpattern1_2_1:
    add(lpattern1_2.part)

    # Cut-Extrude10: cut by cut_extrude10_tool
    add(cut_extrude10_tool.part, mode=Mode.SUBTRACT)


with BuildPart() as lpattern1_3_1:
    add(lpattern1_3.part)

    # Cut-Extrude10: cut by cut_extrude10_tool
    add(cut_extrude10_tool.part, mode=Mode.SUBTRACT)


with BuildPart() as lpattern1_5_1:
    add(lpattern1_5.part)

    # Cut-Extrude10: cut by cut_extrude10_tool
    add(cut_extrude10_tool.part, mode=Mode.SUBTRACT)


with BuildPart() as lpattern1_6_1:
    add(lpattern1_6.part)

    # Cut-Extrude10: cut by cut_extrude10_tool
    add(cut_extrude10_tool.part, mode=Mode.SUBTRACT)


solid = Compound([lpattern1_1.part, lpattern1_4.part, part_2.part])
